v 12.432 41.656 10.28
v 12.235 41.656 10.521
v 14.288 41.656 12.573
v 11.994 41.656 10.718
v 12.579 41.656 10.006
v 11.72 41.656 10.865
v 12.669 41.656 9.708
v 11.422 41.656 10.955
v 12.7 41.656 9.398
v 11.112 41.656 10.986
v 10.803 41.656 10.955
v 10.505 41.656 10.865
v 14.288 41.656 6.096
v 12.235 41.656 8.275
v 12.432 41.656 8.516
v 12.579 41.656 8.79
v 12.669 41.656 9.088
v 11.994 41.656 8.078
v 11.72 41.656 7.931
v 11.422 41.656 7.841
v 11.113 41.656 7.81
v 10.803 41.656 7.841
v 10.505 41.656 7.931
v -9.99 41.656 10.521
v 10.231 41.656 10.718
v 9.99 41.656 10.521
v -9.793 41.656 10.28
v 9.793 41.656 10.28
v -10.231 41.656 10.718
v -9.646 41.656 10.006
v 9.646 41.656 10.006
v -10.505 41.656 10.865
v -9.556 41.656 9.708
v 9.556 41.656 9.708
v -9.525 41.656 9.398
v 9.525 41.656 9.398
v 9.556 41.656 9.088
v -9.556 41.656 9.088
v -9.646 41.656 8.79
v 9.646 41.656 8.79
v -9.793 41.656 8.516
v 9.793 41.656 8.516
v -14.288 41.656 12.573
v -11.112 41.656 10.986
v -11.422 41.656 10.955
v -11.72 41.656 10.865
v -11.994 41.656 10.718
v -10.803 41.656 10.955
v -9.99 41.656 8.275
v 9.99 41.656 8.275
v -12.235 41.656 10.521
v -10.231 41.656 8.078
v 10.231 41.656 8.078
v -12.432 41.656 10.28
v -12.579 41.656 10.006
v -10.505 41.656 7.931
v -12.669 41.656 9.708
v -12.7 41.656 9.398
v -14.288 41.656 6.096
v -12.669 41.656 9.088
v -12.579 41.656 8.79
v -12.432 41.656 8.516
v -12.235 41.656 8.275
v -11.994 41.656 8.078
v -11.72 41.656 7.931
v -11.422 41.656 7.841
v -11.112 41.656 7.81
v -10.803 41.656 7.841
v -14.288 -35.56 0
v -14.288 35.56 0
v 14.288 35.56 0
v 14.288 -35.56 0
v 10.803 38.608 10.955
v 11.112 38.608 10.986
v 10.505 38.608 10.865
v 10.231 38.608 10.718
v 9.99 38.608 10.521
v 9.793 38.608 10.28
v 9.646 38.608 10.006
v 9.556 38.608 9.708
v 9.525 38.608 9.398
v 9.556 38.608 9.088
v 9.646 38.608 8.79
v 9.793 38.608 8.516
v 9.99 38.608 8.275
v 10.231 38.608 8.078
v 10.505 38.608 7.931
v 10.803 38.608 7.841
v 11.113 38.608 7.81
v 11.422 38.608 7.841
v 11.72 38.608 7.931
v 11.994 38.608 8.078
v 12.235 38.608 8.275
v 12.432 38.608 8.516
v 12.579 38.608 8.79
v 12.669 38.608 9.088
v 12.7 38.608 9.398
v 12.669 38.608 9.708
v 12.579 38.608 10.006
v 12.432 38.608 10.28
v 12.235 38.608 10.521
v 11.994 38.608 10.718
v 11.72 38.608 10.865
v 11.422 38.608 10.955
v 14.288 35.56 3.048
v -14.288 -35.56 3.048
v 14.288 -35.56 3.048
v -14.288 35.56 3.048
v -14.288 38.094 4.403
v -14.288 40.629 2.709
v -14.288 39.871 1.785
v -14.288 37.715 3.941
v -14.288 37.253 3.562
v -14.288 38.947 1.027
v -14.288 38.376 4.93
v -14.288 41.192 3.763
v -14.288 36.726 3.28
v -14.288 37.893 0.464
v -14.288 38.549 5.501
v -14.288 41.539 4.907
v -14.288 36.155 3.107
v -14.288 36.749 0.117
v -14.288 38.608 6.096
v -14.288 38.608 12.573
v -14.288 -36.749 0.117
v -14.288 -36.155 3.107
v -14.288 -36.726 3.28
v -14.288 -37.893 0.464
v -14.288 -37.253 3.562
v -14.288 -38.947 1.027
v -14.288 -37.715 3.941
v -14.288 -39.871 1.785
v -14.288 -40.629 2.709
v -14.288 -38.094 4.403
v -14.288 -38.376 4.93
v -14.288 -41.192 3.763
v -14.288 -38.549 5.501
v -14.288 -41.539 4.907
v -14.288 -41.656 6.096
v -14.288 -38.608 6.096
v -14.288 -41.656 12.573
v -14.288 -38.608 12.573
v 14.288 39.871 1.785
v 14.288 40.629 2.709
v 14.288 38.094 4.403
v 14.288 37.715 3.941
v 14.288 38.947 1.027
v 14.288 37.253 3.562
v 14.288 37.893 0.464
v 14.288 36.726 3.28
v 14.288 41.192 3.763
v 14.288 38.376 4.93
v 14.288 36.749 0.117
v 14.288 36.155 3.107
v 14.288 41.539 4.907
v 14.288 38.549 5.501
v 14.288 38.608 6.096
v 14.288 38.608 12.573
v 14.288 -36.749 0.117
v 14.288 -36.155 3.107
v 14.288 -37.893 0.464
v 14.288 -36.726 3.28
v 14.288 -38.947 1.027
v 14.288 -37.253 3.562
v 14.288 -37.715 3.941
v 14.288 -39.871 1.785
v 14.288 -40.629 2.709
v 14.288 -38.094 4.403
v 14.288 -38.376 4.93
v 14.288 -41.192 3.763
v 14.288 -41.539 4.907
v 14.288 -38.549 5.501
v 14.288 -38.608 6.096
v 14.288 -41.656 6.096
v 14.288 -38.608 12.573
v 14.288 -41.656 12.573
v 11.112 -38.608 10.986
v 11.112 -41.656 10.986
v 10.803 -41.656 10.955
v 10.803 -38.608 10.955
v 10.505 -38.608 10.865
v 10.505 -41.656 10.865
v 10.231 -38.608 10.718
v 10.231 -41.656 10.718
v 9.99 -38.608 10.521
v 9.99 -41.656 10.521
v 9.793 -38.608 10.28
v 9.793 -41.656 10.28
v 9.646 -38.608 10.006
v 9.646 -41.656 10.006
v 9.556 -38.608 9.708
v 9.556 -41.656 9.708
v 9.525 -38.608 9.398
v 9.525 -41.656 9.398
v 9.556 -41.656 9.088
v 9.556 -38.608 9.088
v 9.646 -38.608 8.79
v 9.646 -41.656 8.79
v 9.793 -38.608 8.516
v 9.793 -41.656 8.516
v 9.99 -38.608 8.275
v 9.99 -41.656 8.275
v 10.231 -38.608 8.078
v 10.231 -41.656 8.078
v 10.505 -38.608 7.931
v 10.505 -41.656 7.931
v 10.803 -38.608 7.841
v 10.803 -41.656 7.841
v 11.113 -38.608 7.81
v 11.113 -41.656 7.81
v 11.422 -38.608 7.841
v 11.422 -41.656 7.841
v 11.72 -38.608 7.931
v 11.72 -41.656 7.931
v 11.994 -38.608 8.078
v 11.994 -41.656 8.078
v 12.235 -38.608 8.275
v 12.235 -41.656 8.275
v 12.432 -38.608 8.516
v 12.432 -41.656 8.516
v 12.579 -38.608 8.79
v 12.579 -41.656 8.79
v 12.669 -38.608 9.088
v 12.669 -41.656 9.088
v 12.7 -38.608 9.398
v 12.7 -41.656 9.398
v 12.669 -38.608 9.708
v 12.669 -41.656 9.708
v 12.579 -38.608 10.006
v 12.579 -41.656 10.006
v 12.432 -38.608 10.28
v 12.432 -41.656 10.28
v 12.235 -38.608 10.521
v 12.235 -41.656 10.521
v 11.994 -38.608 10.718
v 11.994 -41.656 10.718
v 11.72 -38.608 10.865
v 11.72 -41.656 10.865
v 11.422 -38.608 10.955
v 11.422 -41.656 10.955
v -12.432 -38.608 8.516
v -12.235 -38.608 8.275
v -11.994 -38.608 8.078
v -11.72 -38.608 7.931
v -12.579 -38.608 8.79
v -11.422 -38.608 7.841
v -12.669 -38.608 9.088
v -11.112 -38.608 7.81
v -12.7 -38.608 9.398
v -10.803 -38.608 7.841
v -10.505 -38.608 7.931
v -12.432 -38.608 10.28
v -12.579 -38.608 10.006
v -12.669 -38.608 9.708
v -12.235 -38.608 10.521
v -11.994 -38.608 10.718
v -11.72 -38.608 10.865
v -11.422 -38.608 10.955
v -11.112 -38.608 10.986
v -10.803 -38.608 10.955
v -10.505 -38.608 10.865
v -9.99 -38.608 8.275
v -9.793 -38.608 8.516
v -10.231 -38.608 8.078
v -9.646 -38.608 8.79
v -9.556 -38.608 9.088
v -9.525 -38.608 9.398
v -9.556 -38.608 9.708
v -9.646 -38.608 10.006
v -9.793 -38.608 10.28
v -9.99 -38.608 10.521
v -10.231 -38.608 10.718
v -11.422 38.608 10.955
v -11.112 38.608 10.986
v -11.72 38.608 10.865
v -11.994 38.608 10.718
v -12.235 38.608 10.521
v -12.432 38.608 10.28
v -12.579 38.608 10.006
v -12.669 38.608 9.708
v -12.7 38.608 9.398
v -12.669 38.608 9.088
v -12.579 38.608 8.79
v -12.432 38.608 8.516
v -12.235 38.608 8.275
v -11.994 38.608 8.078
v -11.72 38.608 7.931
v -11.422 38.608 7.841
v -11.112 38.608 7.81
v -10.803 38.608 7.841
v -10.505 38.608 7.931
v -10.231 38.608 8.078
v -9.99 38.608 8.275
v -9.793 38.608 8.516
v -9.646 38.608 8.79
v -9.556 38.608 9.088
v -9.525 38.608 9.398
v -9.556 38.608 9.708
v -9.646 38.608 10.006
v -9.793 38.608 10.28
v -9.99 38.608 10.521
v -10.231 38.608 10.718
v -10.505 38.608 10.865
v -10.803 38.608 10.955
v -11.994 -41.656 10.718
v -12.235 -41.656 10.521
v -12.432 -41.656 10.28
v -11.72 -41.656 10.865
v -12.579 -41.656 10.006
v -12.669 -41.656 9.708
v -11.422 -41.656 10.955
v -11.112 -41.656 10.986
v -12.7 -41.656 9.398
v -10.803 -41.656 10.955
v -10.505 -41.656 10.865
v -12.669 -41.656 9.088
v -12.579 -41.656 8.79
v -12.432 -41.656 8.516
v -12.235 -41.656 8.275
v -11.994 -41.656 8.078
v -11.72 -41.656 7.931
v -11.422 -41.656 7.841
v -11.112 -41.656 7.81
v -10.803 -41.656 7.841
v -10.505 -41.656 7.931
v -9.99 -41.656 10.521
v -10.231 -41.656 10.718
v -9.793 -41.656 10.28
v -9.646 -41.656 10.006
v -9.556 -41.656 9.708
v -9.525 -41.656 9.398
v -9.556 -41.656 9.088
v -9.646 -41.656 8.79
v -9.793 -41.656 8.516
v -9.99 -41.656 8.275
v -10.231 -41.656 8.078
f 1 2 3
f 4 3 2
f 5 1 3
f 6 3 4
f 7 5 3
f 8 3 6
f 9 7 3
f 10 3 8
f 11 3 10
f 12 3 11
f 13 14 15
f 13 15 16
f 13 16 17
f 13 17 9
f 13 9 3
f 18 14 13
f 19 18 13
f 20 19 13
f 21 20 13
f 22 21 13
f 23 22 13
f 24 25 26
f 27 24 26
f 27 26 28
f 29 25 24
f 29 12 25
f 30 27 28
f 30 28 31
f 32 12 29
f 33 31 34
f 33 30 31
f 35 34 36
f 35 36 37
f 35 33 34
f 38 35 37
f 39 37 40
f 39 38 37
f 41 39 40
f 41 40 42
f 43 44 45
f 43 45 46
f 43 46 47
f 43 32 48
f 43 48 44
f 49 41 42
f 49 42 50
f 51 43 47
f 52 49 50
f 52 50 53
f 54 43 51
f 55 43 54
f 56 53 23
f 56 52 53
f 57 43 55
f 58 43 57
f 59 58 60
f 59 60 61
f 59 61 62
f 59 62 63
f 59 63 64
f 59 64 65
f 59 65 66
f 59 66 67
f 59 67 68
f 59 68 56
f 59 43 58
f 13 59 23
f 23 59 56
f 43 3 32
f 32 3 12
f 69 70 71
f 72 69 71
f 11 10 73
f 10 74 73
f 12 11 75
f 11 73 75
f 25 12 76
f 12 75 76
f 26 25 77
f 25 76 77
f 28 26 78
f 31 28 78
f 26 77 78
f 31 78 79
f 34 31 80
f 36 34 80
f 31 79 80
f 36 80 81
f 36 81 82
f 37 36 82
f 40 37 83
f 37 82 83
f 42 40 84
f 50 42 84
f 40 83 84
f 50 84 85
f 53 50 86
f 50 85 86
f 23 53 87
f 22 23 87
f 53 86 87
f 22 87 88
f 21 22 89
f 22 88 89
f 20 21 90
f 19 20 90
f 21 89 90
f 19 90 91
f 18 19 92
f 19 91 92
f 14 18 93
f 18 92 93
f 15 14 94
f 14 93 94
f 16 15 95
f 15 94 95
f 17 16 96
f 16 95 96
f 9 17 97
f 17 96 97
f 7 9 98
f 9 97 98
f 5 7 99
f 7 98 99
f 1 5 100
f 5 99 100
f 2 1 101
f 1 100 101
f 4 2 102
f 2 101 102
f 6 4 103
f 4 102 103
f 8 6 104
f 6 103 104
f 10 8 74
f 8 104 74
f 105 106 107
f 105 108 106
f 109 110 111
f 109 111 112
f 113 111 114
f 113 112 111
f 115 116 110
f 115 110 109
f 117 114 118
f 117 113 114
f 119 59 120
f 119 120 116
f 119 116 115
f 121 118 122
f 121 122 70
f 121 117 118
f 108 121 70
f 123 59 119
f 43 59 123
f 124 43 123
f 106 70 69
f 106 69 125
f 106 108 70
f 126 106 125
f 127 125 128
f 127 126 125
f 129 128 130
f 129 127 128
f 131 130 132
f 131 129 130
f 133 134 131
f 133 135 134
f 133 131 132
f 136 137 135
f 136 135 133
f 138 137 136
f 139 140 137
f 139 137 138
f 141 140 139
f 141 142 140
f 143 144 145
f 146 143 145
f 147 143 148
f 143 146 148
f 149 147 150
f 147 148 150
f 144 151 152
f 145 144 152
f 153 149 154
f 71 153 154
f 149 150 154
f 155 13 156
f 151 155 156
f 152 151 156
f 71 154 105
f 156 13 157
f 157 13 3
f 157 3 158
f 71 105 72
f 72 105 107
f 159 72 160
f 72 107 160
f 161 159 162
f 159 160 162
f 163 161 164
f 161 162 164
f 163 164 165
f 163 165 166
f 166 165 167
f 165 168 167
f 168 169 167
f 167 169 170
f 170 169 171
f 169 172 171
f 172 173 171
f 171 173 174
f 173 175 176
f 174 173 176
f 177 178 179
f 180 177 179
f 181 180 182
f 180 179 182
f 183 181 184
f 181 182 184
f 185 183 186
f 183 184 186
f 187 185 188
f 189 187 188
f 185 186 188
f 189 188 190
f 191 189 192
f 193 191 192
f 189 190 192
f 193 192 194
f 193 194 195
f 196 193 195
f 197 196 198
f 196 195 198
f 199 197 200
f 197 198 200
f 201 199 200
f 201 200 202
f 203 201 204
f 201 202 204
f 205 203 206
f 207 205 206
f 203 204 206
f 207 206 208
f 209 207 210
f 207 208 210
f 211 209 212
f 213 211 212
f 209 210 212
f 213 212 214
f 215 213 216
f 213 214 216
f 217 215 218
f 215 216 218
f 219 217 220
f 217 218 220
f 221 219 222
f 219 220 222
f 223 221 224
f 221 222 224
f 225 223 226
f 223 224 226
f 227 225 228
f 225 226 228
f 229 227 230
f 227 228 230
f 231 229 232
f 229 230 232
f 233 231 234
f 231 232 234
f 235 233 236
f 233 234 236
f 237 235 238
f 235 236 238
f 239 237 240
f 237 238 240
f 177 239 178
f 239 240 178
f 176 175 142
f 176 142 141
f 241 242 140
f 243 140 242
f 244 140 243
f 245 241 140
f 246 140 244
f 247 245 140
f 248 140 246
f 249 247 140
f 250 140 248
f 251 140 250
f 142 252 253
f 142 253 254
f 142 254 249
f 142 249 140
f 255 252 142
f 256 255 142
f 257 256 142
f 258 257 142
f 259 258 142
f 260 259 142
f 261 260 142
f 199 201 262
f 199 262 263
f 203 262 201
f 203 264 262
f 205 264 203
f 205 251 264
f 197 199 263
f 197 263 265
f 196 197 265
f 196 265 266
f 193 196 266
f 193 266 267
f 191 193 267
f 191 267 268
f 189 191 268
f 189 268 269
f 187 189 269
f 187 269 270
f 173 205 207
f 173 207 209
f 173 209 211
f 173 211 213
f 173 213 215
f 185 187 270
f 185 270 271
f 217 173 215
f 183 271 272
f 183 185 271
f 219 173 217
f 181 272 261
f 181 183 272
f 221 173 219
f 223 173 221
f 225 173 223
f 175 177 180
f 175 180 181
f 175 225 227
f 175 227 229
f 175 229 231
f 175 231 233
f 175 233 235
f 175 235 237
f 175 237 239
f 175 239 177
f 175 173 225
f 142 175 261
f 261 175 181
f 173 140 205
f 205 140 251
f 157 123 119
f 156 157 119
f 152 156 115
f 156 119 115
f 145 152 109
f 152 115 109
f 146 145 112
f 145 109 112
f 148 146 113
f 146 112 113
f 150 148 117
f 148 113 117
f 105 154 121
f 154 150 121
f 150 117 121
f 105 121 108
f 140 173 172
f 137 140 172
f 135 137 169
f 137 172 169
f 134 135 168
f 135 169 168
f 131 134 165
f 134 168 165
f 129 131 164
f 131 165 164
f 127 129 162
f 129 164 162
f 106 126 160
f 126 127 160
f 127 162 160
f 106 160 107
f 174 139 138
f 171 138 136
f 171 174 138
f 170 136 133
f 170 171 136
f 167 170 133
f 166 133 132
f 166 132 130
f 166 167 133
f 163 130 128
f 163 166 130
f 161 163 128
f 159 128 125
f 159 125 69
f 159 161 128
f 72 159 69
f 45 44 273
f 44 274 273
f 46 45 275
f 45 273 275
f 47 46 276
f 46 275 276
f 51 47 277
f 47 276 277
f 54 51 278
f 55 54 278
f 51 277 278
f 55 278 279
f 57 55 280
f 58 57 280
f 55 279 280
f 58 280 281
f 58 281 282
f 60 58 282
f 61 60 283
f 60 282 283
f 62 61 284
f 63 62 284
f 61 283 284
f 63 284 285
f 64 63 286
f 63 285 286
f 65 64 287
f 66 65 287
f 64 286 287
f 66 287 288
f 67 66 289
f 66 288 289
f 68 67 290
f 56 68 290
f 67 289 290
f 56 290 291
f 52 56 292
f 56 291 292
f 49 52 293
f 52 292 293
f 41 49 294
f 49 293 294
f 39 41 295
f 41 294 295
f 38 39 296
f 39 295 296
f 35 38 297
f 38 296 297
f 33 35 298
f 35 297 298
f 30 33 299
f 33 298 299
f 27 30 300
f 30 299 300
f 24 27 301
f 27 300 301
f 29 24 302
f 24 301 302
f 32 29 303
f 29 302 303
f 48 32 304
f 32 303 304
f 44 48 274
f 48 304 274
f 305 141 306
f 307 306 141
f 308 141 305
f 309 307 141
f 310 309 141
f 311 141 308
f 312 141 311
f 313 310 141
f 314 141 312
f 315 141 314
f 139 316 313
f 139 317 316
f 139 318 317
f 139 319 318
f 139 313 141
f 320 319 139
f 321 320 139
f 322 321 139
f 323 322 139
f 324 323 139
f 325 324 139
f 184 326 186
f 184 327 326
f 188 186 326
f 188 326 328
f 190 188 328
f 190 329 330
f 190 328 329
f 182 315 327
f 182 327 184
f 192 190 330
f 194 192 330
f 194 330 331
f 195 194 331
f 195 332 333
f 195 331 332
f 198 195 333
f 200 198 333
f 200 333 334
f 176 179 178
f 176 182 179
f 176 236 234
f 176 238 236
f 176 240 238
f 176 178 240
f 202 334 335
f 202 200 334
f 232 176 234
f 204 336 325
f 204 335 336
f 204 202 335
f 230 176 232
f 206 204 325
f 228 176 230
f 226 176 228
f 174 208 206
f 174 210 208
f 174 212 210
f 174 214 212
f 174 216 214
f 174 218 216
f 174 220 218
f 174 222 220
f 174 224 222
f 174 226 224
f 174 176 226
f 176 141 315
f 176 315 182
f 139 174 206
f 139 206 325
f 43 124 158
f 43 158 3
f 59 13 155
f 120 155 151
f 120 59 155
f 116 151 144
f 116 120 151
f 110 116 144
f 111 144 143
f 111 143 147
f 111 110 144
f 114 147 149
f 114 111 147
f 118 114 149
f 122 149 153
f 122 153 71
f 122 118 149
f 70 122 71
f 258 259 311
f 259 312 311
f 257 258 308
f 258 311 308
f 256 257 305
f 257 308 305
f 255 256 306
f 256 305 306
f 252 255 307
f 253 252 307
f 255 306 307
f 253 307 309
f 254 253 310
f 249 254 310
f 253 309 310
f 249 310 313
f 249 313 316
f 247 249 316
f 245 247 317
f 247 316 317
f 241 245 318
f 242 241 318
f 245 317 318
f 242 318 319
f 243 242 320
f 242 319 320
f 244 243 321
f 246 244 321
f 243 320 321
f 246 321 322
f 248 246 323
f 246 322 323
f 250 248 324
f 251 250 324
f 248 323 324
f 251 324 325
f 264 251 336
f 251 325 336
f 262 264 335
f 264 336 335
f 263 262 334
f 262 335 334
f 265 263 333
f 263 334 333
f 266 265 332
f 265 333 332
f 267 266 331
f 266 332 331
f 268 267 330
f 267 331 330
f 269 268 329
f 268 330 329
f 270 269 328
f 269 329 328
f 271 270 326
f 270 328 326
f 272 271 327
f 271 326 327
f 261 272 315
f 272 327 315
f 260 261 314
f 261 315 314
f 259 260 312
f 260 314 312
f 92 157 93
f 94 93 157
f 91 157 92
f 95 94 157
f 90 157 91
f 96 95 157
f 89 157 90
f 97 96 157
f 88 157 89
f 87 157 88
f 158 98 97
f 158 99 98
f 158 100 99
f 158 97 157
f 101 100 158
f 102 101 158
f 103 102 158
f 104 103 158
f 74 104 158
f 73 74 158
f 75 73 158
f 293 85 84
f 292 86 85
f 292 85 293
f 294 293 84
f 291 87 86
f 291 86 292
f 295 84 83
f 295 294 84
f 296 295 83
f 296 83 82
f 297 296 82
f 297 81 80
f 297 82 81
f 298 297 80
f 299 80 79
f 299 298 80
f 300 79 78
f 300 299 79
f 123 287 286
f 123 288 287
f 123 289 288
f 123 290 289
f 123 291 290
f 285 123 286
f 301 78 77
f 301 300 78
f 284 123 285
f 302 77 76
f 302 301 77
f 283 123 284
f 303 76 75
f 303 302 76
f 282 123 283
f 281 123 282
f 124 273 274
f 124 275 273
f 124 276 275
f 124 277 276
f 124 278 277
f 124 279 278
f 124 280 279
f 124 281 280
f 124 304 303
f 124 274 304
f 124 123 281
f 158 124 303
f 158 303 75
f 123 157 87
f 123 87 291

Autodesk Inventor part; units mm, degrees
ref_plane "YZ Plane" through (0, 0, 0) normal (1, 0, 0) x (0, 1, 0)
ref_plane "XZ Plane" through (0, 0, 0) normal (0, 1, 0) x (-1, 0, 0)
ref_plane "XY Plane" through (0, 0, 0) normal (0, 0, 1) x (1, 0, 0)
sketch "Sketch1" plane through (0, 0, 0) normal (0, 0, 1) x (1, 0, 0)
  line L0 (-14.2875, 41.656) -> (14.2875, 41.656)
  line L1 (14.2875, 41.656) -> (14.2875, -41.656)
  line L2 (14.2875, -41.656) -> (-14.2875, -41.656)
  line L3 (-14.2875, -41.656) -> (-14.2875, 41.656)
  point P0 (0, 0)
  dimension "d0" = 28.575
  dimension "d1" = 83.312
  dimension "d2" = 14.2875
  dimension "d3" = 41.656
extrude "Plate2" add sketch "Sketch1" along normal blind 3.048
sketch "Sketch2" plane through (-14.2875, 38.608, 0) normal (0, 1, 0) x (-1, 0, 0)
  line L0 (-28.575, 0) -> (0, 0)
  line L1 (0, 0) -> (0, 12.573)
  line L2 (0, 12.573) -> (-28.575, 12.573)
  line L3 (-28.575, 12.573) -> (-28.575, 0)
edge flange "Flange1" height 9.525 angle 90 thickness 3.048 bend radius 3.048 thickness toward (0, 1, 0) relief tear relief width 3.048 relief depth 1.524 corner gap 3.048 corner form 0 edges at (0, 41.656, 3.048) (0, -41.656, 3.048) wall of the first edge with corners at (14.2875, 38.608, 0) (-14.2875, 38.608, 0) (-14.2875, 38.608, 12.573) (14.2875, 38.608, 12.573)
bend "Bend1"
corner "Corner1"
sketch "Sketch3" plane through (-14.2875, -38.608, 12.573) normal (0, 1, 0) x (1, 0, 0)
  line L0 (0, 0) -> (0, 6.477) projected
  line L1 (0, 0) -> (28.575, 0) projected
  line L2 (28.575, 0) -> (28.575, 6.477) projected
  point P0 (14.2875, 12.573)
  point P1 (3.175, 3.175)
  point P2 (25.4, 3.175)
  dimension "d16" = 3.175
  dimension "d17" = 3.175
  dimension "d18" = 3.175
  dimension "d19" = 3.175
hole "Hole1" at (-11.1125, -38.608, 9.398) at (11.1125, -38.608, 9.398) direction (0, -1, 0) diameter 3.175 end through all
sketch "Sketch5" plane through (-14.2875, 41.656, 12.573) normal (0, 1, 0) x (1, 0, 0)
  circle A0 centre (3.175, 3.175) radius 1.5875 projected
  circle A1 centre (25.4, 3.175) radius 1.5875 projected
  point P0 (14.2875, 12.573)
hole "Hole2" at (-11.1125, 41.656, 9.398) at (11.1125, 41.656, 9.398) direction (0, -1, 0) diameter 3.175 end through all
equation "\"d18\" = d17"
equation "\"d19\" = d16"
equation "\"d25\" = Thickness"
equation "\"d32\" = Thickness"
equation "\"d6\" = BendReliefWidth"
equation "\"d7\" = BendReliefDepth"
equation "\"d8\" = MinimumRemnant"
equation "\"d9\" = BendRadius"
equation "\"d12\" = BendRadius"
equation "\"d13\" = CornerReliefSize"
equation "\"d14\" = GapSize"
equation "\"d15\" = JacobiRadiusSize"
equation "\"d2\" = 0.5 * d0"
equation "\"d3\" = 0.5 * d1"
equation "\"BendRadius\" = Thickness"
equation "\"BendReliefWidth\" = Thickness"
equation "\"BendReliefDepth\" = 0.5 * Thickness"
equation "\"CornerReliefSize\" = 4 * Thickness"
equation "\"MinimumRemnant\" = 2 * Thickness"
equation "\"TransitionRadius\" = BendRadius"
equation "\"JacobiRadiusSize\" = BendRadius"
equation "\"GapSize\" = Thickness"
equation "\"d4\" = BendRadius"
equation "\"d5\" = BendRadius"
equation "\"Thickness\" = 3.048"
properties part number "gearbox rib"
